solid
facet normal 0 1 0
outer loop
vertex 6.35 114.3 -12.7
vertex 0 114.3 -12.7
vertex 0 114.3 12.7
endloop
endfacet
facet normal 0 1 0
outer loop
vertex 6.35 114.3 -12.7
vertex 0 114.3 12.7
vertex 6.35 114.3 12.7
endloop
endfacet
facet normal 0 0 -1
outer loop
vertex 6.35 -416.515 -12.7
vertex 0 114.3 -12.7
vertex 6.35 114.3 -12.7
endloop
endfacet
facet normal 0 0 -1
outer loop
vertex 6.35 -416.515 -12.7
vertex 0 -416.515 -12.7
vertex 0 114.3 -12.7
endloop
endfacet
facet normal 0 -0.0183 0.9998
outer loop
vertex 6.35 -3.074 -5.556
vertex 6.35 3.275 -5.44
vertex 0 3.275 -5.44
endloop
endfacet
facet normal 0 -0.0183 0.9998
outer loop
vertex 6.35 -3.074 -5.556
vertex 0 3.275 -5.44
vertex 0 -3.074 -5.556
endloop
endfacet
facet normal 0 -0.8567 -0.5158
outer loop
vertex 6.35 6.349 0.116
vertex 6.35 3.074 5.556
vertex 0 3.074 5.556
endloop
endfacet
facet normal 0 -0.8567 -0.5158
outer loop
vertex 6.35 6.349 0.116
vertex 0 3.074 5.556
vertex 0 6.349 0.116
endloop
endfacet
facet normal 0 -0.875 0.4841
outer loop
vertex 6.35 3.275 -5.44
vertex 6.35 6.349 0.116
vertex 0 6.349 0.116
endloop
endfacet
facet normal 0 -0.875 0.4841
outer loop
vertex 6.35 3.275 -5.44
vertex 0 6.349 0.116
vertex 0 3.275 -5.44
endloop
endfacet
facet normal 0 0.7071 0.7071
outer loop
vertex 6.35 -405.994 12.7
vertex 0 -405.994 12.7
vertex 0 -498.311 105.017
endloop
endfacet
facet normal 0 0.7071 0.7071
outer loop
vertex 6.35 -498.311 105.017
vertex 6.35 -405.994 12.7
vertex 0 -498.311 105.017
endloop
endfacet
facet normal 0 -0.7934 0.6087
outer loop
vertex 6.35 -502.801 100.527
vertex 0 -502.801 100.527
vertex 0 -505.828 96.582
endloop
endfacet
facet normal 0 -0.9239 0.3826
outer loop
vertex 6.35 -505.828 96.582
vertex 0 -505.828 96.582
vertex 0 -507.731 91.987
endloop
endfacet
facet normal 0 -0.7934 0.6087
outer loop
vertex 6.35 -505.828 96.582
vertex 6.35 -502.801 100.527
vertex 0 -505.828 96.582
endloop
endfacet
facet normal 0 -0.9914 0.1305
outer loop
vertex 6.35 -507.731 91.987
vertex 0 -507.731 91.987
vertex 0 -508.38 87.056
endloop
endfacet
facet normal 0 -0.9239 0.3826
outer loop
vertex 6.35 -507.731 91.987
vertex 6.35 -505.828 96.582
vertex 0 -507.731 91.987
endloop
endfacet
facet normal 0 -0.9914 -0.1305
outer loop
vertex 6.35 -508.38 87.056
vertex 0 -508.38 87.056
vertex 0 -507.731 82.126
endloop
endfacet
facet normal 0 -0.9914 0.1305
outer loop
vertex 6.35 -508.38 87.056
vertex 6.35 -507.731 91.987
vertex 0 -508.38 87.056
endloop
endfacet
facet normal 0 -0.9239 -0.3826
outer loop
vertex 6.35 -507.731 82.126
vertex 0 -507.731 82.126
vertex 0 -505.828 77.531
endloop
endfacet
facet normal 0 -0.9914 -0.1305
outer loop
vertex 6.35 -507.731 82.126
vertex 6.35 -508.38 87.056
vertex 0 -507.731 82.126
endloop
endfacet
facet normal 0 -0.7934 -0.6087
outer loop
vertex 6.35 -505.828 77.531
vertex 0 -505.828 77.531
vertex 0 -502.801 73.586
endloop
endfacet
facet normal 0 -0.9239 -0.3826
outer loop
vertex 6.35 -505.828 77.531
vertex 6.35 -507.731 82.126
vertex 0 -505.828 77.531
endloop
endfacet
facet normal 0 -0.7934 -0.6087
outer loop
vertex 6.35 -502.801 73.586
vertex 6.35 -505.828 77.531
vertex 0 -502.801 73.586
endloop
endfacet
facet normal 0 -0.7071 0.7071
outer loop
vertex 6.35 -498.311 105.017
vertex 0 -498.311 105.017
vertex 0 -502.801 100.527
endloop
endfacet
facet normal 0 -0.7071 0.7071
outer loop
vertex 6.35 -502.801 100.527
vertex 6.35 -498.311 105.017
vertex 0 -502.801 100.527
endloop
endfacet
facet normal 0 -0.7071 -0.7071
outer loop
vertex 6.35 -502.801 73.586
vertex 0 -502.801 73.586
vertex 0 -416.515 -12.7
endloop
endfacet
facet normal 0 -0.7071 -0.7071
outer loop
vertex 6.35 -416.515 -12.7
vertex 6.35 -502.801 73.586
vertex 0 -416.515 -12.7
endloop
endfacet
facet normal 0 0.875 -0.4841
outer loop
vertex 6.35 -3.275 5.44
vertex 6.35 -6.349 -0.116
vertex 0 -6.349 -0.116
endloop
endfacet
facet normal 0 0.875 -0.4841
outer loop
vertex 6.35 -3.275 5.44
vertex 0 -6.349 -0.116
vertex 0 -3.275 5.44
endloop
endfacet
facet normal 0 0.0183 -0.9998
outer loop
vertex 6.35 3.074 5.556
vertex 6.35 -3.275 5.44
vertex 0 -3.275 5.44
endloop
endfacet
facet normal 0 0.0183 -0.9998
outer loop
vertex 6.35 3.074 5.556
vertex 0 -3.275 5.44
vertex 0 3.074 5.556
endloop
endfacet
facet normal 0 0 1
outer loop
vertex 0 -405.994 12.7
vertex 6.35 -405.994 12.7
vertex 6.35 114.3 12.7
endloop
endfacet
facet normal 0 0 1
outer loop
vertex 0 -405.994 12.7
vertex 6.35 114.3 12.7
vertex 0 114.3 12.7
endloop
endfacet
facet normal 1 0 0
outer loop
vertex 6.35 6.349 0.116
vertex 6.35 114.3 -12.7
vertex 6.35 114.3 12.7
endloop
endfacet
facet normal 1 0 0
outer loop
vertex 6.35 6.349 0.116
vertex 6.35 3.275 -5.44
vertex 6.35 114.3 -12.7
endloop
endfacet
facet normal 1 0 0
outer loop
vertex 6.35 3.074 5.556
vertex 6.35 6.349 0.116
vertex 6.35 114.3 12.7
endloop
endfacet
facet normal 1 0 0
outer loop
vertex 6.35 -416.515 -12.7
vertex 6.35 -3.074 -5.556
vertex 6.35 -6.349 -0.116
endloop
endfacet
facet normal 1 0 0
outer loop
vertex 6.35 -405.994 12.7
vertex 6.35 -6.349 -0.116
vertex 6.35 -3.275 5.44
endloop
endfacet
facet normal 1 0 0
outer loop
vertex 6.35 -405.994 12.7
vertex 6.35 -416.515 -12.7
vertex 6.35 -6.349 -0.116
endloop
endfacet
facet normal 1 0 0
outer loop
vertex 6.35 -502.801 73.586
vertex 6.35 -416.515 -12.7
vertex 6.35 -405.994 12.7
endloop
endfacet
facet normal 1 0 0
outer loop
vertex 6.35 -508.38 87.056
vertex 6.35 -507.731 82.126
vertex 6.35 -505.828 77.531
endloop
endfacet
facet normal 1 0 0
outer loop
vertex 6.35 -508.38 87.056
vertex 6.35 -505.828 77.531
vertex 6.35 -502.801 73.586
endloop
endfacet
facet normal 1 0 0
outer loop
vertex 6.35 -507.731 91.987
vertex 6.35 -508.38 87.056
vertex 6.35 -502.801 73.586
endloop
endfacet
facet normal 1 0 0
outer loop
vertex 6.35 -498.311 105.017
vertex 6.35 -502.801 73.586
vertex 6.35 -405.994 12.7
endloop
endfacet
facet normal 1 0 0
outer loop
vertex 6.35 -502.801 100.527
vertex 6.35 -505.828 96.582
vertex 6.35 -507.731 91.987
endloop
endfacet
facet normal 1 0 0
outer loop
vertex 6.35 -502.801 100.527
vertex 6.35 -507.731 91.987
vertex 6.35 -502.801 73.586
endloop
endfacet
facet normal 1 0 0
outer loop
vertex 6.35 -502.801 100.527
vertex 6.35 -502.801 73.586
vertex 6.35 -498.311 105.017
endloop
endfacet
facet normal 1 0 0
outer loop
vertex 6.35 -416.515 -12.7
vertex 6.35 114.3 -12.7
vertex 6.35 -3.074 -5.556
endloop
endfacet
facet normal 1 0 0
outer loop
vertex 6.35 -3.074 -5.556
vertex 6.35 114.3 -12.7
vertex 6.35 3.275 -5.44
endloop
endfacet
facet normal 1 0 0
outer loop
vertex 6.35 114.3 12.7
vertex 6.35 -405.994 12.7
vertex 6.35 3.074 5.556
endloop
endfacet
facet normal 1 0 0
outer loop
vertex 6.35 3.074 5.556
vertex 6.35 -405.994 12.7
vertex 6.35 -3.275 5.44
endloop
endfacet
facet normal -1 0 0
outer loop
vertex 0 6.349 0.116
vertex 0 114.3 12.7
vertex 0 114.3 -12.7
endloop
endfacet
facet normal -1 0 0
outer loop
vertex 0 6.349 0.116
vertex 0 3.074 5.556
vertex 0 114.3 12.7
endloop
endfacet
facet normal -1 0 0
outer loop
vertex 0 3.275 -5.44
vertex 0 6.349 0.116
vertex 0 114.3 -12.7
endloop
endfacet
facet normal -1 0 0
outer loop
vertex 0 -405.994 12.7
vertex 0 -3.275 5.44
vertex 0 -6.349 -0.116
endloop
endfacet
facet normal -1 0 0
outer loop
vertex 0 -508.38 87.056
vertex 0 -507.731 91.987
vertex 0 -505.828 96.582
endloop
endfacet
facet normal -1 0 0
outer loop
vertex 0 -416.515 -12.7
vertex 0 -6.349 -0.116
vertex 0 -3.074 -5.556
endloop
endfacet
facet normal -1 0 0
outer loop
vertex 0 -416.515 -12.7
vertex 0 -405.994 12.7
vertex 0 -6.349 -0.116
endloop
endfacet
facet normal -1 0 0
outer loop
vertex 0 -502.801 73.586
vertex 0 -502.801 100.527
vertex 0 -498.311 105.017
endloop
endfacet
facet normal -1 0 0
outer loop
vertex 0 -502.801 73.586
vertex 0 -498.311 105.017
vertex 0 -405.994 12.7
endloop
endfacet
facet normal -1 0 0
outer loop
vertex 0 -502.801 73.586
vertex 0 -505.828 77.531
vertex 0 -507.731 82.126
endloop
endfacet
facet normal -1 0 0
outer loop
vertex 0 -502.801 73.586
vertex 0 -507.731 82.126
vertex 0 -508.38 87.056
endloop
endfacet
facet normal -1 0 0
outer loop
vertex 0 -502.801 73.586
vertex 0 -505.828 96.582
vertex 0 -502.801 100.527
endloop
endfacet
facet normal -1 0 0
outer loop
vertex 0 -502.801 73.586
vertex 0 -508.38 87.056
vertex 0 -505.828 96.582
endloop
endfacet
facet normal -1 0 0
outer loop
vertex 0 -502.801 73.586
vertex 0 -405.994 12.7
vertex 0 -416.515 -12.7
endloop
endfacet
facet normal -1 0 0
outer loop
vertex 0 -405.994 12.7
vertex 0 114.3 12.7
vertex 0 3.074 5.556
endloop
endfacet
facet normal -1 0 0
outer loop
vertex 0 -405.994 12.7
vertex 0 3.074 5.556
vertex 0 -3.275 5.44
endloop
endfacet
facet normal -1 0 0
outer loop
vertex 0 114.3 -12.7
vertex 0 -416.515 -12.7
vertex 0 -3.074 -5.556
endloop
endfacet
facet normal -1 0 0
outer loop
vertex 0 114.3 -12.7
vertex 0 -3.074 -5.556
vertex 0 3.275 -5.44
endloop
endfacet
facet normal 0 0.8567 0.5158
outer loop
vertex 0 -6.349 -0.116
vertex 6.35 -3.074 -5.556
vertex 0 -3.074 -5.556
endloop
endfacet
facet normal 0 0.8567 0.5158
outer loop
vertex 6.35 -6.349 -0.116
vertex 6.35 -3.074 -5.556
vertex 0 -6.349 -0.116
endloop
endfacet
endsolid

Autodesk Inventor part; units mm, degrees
ref_plane "YZ Plane" through (0, 0, 0) normal (1, 0, 0) x (0, 1, 0)
ref_plane "XZ Plane" through (0, 0, 0) normal (0, 1, 0) x (-1, 0, 0)
ref_plane "XY Plane" through (0, 0, 0) normal (0, 0, 1) x (1, 0, 0)
sketch "Sketch1" plane through (0, 0, 0) normal (1, 0, 0) x (0, 1, 0)
  circle A0 centre (0, 0) radius 3.175
  line L0 (0, 0) -> (12.7, 0)
  line L1 (0, 0) -> (12.7, 0) construction
  line L2 (12.7, 0) -> (12.7, -12.7)
  line L3 (12.7, -12.7) -> (-405.9936, -12.7)
  line L4 (-405.9936, -12.7) -> (-405.9936, 12.7)
  line L5 (-405.9936, 12.7) -> (12.7, 12.7)
  line L6 (12.7, 12.7) -> (12.7, -12.7)
  line L7 (-405.9936, 12.7) -> (-498.3106, 105.017)
  line L8 (-405.9936, 12.7) -> (-275.4376, 12.7) construction
  line L9 (-498.3106, 105.017) -> (-516.2711, 87.0565)
  line L10 (-516.2711, 87.0565) -> (-408.5081, -20.7066)
  line L11 (-405.9936, -12.7) -> (-431.3936, -12.7)
  line L12 (-405.9936, -12.7) -> (-380.5936, -12.7) construction
  line L13 (-516.2711, 87.0565) -> (-416.5146, -12.7)
  line L14 (-416.5146, -12.7) -> (12.7, -12.7)
  dimension "d0" = 6.35
  dimension "d1" = 12.7
  dimension "d2" = 0
  dimension "d3" = 12.7
  dimension "d4" = 90
  dimension "d5" = 418.6936
  dimension "d6" = 25.4
  dimension "d7" = 130.556
  dimension "d8" = 135
  dimension "d9" = 25.4
  dimension "d10" = 90
  dimension "d11" = 152.4
  dimension "d12" = 90
  dimension "d13" = 25.4
  dimension "d14" = 180
extrude "Extrusion1" add sketch "Sketch1" along normal blind 25.4
sketch "Sketch2" plane through (25.4, 0, 0) normal (1, 0, 0) x (0, 0, -1)
  line L0 (-105.017, -498.3106) -> (-87.0565, -516.2711) projected
  line L1 (-87.0565, -516.2711) -> (12.7, -416.5146) projected
  line L2 (-12.7, 12.7) -> (-12.7, -405.9936) projected
  line L3 (-96.0368, -507.2909) -> (-78.0763, -507.2909)
  line L4 (-105.017, -498.3106) -> (-100.5269, -502.8008)
  line L5 (-100.5269, -502.8008) -> (-73.5861, -502.8008)
  arc A0 (-100.5269, -502.8008) -> (-73.5861, -502.8008) centre (-87.0565, -489.3304) ccw
  dimension "d17" = 6.35
  dimension "d18" = 19.05
extrude "Extrusion2" cut sketch "Sketch2" against normal blind 25.4 contours A0 L3 L0 | L3 A0 L1 L0 | L1 L3 A0
sketch "Sketch3" plane through (0, 12.7, 12.7) normal (0, 1, 0) x (1, 0, 0)
  line L0 (0, 25.4) -> (0, 0) projected
  line L1 (0, 0) -> (25.4, 0) projected
  line L2 (25.4, 25.4) -> (25.4, 0) projected
  line L3 (0, 25.4) -> (25.4, 25.4) projected
  point P0 (0, 12.7)
extrude "Extrusion3" add sketch "Sketch3" along normal blind 127
sketch "Sketch4" plane through (25.4, 0, 0) normal (1, 0, 0) x (0, 0, -1)
  arc A0 (-100.5269, -502.8008) -> (-73.5861, -502.8008) centre (-87.0565, -489.3304) ccw projected
  line L0 (-73.5861, -502.8008) -> (12.7, -416.5146) projected
  line L1 (12.7, -416.5146) -> (12.7, 139.7) projected
  line L2 (-12.7, 139.7) -> (12.7, 139.7) projected
  line L3 (-12.7, -405.9936) -> (-12.7, 139.7) projected
  line L4 (-12.7, -405.9936) -> (-105.017, -498.3106) projected
  line L5 (-105.017, -498.3106) -> (-100.5269, -502.8008) projected
  circle A1 centre (0, 0) radius 3.175 projected
extrude "Extrusion4" cut sketch "Sketch4" against normal blind 19.05
sketch "Sketch5" plane through (6.35, 0, 0) normal (1, 0, 0) x (0, 0, -1)
  line L0 (-12.7, 139.7) -> (12.7, 139.7)
  line L1 (12.7, 139.7) -> (12.7, 12.7)
  line L2 (12.7, 12.7) -> (-12.7, 12.7)
  line L3 (-12.7, 12.7) -> (-12.7, 139.7)
  dimension "d25" = 25.4
  dimension "d26" = 127
extrude "Extrusion5" cut sketch "Sketch5" against normal blind 127
sketch "Sketch8" plane through (6.35, 12.7, 12.7) normal (0, 1, 0) x (1, 0, 0)
  line L0 (-6.35, 0) -> (-6.35, 25.4) projected
  line L1 (0, 0) -> (-6.35, 0) projected
  line L2 (0, 25.4) -> (0, 0) projected
  line L3 (-6.35, 25.4) -> (0, 25.4) projected
  point P0 (-6.35, 12.7)
extrude "Extrusion8" add sketch "Sketch8" along normal blind 101.6
sketch "Sketch9" plane through (6.35, 0, 0) normal (1, 0, 0) x (0, 0, -1)
  circle A0 centre (0, 0) radius 3.175 projected
  circle A1 centre (0, 0) radius 6.35
  dimension "d45" = 12.7
extrude "Extrusion9" cut sketch "Sketch9" against normal blind 25.4
sketch "Sketch10" plane through (6.35, 0, 0) normal (1, 0, 0) x (0, 0, -1)
  circle A0 centre (0, 0) radius 6.35 projected
  line L0 (-5.5563, -5.5563) -> (5.5563, -5.5563)
  line L1 (5.5563, -5.5563) -> (5.5563, 5.5563)
  line L2 (5.5563, 5.5563) -> (-5.5563, 5.5563)
  line L3 (-5.5563, 5.5563) -> (-5.5563, -5.5563)
  line L4 (-5.5563, -5.5563) -> (5.5563, 5.5563) construction
  line L5 (5.5563, -5.5563) -> (-5.5563, 5.5563) construction
  line L6 (5.5563, -3.0742) -> (0.1158, -6.3489)
  line L7 (0.1158, -6.3489) -> (-5.4404, -3.2748)
  line L8 (-5.4404, -3.2748) -> (-5.5563, 3.0742)
  line L9 (-5.5563, 3.0742) -> (-0.1158, 6.3489)
  line L10 (-0.1158, 6.3489) -> (5.4404, 3.2748)
  line L11 (5.4404, 3.2748) -> (5.5563, -3.0742)
  dimension "d48" = 11.1125
  dimension "d49" = 11.1125
extrude "Extrusion10" add sketch "Sketch10" against normal blind 6.35 contours L1 A0 | L11 A0 L1 | A0 L0 L6 | A0 L6 L0 | L10 L2 A0 | A0 L0 L7 | L0 A0 L7 | L2 L10 A0 | A0 L3 L8 | L9 L2 A0 | L9 A0 L2 | A0 L3
properties part number "FlatArm"
